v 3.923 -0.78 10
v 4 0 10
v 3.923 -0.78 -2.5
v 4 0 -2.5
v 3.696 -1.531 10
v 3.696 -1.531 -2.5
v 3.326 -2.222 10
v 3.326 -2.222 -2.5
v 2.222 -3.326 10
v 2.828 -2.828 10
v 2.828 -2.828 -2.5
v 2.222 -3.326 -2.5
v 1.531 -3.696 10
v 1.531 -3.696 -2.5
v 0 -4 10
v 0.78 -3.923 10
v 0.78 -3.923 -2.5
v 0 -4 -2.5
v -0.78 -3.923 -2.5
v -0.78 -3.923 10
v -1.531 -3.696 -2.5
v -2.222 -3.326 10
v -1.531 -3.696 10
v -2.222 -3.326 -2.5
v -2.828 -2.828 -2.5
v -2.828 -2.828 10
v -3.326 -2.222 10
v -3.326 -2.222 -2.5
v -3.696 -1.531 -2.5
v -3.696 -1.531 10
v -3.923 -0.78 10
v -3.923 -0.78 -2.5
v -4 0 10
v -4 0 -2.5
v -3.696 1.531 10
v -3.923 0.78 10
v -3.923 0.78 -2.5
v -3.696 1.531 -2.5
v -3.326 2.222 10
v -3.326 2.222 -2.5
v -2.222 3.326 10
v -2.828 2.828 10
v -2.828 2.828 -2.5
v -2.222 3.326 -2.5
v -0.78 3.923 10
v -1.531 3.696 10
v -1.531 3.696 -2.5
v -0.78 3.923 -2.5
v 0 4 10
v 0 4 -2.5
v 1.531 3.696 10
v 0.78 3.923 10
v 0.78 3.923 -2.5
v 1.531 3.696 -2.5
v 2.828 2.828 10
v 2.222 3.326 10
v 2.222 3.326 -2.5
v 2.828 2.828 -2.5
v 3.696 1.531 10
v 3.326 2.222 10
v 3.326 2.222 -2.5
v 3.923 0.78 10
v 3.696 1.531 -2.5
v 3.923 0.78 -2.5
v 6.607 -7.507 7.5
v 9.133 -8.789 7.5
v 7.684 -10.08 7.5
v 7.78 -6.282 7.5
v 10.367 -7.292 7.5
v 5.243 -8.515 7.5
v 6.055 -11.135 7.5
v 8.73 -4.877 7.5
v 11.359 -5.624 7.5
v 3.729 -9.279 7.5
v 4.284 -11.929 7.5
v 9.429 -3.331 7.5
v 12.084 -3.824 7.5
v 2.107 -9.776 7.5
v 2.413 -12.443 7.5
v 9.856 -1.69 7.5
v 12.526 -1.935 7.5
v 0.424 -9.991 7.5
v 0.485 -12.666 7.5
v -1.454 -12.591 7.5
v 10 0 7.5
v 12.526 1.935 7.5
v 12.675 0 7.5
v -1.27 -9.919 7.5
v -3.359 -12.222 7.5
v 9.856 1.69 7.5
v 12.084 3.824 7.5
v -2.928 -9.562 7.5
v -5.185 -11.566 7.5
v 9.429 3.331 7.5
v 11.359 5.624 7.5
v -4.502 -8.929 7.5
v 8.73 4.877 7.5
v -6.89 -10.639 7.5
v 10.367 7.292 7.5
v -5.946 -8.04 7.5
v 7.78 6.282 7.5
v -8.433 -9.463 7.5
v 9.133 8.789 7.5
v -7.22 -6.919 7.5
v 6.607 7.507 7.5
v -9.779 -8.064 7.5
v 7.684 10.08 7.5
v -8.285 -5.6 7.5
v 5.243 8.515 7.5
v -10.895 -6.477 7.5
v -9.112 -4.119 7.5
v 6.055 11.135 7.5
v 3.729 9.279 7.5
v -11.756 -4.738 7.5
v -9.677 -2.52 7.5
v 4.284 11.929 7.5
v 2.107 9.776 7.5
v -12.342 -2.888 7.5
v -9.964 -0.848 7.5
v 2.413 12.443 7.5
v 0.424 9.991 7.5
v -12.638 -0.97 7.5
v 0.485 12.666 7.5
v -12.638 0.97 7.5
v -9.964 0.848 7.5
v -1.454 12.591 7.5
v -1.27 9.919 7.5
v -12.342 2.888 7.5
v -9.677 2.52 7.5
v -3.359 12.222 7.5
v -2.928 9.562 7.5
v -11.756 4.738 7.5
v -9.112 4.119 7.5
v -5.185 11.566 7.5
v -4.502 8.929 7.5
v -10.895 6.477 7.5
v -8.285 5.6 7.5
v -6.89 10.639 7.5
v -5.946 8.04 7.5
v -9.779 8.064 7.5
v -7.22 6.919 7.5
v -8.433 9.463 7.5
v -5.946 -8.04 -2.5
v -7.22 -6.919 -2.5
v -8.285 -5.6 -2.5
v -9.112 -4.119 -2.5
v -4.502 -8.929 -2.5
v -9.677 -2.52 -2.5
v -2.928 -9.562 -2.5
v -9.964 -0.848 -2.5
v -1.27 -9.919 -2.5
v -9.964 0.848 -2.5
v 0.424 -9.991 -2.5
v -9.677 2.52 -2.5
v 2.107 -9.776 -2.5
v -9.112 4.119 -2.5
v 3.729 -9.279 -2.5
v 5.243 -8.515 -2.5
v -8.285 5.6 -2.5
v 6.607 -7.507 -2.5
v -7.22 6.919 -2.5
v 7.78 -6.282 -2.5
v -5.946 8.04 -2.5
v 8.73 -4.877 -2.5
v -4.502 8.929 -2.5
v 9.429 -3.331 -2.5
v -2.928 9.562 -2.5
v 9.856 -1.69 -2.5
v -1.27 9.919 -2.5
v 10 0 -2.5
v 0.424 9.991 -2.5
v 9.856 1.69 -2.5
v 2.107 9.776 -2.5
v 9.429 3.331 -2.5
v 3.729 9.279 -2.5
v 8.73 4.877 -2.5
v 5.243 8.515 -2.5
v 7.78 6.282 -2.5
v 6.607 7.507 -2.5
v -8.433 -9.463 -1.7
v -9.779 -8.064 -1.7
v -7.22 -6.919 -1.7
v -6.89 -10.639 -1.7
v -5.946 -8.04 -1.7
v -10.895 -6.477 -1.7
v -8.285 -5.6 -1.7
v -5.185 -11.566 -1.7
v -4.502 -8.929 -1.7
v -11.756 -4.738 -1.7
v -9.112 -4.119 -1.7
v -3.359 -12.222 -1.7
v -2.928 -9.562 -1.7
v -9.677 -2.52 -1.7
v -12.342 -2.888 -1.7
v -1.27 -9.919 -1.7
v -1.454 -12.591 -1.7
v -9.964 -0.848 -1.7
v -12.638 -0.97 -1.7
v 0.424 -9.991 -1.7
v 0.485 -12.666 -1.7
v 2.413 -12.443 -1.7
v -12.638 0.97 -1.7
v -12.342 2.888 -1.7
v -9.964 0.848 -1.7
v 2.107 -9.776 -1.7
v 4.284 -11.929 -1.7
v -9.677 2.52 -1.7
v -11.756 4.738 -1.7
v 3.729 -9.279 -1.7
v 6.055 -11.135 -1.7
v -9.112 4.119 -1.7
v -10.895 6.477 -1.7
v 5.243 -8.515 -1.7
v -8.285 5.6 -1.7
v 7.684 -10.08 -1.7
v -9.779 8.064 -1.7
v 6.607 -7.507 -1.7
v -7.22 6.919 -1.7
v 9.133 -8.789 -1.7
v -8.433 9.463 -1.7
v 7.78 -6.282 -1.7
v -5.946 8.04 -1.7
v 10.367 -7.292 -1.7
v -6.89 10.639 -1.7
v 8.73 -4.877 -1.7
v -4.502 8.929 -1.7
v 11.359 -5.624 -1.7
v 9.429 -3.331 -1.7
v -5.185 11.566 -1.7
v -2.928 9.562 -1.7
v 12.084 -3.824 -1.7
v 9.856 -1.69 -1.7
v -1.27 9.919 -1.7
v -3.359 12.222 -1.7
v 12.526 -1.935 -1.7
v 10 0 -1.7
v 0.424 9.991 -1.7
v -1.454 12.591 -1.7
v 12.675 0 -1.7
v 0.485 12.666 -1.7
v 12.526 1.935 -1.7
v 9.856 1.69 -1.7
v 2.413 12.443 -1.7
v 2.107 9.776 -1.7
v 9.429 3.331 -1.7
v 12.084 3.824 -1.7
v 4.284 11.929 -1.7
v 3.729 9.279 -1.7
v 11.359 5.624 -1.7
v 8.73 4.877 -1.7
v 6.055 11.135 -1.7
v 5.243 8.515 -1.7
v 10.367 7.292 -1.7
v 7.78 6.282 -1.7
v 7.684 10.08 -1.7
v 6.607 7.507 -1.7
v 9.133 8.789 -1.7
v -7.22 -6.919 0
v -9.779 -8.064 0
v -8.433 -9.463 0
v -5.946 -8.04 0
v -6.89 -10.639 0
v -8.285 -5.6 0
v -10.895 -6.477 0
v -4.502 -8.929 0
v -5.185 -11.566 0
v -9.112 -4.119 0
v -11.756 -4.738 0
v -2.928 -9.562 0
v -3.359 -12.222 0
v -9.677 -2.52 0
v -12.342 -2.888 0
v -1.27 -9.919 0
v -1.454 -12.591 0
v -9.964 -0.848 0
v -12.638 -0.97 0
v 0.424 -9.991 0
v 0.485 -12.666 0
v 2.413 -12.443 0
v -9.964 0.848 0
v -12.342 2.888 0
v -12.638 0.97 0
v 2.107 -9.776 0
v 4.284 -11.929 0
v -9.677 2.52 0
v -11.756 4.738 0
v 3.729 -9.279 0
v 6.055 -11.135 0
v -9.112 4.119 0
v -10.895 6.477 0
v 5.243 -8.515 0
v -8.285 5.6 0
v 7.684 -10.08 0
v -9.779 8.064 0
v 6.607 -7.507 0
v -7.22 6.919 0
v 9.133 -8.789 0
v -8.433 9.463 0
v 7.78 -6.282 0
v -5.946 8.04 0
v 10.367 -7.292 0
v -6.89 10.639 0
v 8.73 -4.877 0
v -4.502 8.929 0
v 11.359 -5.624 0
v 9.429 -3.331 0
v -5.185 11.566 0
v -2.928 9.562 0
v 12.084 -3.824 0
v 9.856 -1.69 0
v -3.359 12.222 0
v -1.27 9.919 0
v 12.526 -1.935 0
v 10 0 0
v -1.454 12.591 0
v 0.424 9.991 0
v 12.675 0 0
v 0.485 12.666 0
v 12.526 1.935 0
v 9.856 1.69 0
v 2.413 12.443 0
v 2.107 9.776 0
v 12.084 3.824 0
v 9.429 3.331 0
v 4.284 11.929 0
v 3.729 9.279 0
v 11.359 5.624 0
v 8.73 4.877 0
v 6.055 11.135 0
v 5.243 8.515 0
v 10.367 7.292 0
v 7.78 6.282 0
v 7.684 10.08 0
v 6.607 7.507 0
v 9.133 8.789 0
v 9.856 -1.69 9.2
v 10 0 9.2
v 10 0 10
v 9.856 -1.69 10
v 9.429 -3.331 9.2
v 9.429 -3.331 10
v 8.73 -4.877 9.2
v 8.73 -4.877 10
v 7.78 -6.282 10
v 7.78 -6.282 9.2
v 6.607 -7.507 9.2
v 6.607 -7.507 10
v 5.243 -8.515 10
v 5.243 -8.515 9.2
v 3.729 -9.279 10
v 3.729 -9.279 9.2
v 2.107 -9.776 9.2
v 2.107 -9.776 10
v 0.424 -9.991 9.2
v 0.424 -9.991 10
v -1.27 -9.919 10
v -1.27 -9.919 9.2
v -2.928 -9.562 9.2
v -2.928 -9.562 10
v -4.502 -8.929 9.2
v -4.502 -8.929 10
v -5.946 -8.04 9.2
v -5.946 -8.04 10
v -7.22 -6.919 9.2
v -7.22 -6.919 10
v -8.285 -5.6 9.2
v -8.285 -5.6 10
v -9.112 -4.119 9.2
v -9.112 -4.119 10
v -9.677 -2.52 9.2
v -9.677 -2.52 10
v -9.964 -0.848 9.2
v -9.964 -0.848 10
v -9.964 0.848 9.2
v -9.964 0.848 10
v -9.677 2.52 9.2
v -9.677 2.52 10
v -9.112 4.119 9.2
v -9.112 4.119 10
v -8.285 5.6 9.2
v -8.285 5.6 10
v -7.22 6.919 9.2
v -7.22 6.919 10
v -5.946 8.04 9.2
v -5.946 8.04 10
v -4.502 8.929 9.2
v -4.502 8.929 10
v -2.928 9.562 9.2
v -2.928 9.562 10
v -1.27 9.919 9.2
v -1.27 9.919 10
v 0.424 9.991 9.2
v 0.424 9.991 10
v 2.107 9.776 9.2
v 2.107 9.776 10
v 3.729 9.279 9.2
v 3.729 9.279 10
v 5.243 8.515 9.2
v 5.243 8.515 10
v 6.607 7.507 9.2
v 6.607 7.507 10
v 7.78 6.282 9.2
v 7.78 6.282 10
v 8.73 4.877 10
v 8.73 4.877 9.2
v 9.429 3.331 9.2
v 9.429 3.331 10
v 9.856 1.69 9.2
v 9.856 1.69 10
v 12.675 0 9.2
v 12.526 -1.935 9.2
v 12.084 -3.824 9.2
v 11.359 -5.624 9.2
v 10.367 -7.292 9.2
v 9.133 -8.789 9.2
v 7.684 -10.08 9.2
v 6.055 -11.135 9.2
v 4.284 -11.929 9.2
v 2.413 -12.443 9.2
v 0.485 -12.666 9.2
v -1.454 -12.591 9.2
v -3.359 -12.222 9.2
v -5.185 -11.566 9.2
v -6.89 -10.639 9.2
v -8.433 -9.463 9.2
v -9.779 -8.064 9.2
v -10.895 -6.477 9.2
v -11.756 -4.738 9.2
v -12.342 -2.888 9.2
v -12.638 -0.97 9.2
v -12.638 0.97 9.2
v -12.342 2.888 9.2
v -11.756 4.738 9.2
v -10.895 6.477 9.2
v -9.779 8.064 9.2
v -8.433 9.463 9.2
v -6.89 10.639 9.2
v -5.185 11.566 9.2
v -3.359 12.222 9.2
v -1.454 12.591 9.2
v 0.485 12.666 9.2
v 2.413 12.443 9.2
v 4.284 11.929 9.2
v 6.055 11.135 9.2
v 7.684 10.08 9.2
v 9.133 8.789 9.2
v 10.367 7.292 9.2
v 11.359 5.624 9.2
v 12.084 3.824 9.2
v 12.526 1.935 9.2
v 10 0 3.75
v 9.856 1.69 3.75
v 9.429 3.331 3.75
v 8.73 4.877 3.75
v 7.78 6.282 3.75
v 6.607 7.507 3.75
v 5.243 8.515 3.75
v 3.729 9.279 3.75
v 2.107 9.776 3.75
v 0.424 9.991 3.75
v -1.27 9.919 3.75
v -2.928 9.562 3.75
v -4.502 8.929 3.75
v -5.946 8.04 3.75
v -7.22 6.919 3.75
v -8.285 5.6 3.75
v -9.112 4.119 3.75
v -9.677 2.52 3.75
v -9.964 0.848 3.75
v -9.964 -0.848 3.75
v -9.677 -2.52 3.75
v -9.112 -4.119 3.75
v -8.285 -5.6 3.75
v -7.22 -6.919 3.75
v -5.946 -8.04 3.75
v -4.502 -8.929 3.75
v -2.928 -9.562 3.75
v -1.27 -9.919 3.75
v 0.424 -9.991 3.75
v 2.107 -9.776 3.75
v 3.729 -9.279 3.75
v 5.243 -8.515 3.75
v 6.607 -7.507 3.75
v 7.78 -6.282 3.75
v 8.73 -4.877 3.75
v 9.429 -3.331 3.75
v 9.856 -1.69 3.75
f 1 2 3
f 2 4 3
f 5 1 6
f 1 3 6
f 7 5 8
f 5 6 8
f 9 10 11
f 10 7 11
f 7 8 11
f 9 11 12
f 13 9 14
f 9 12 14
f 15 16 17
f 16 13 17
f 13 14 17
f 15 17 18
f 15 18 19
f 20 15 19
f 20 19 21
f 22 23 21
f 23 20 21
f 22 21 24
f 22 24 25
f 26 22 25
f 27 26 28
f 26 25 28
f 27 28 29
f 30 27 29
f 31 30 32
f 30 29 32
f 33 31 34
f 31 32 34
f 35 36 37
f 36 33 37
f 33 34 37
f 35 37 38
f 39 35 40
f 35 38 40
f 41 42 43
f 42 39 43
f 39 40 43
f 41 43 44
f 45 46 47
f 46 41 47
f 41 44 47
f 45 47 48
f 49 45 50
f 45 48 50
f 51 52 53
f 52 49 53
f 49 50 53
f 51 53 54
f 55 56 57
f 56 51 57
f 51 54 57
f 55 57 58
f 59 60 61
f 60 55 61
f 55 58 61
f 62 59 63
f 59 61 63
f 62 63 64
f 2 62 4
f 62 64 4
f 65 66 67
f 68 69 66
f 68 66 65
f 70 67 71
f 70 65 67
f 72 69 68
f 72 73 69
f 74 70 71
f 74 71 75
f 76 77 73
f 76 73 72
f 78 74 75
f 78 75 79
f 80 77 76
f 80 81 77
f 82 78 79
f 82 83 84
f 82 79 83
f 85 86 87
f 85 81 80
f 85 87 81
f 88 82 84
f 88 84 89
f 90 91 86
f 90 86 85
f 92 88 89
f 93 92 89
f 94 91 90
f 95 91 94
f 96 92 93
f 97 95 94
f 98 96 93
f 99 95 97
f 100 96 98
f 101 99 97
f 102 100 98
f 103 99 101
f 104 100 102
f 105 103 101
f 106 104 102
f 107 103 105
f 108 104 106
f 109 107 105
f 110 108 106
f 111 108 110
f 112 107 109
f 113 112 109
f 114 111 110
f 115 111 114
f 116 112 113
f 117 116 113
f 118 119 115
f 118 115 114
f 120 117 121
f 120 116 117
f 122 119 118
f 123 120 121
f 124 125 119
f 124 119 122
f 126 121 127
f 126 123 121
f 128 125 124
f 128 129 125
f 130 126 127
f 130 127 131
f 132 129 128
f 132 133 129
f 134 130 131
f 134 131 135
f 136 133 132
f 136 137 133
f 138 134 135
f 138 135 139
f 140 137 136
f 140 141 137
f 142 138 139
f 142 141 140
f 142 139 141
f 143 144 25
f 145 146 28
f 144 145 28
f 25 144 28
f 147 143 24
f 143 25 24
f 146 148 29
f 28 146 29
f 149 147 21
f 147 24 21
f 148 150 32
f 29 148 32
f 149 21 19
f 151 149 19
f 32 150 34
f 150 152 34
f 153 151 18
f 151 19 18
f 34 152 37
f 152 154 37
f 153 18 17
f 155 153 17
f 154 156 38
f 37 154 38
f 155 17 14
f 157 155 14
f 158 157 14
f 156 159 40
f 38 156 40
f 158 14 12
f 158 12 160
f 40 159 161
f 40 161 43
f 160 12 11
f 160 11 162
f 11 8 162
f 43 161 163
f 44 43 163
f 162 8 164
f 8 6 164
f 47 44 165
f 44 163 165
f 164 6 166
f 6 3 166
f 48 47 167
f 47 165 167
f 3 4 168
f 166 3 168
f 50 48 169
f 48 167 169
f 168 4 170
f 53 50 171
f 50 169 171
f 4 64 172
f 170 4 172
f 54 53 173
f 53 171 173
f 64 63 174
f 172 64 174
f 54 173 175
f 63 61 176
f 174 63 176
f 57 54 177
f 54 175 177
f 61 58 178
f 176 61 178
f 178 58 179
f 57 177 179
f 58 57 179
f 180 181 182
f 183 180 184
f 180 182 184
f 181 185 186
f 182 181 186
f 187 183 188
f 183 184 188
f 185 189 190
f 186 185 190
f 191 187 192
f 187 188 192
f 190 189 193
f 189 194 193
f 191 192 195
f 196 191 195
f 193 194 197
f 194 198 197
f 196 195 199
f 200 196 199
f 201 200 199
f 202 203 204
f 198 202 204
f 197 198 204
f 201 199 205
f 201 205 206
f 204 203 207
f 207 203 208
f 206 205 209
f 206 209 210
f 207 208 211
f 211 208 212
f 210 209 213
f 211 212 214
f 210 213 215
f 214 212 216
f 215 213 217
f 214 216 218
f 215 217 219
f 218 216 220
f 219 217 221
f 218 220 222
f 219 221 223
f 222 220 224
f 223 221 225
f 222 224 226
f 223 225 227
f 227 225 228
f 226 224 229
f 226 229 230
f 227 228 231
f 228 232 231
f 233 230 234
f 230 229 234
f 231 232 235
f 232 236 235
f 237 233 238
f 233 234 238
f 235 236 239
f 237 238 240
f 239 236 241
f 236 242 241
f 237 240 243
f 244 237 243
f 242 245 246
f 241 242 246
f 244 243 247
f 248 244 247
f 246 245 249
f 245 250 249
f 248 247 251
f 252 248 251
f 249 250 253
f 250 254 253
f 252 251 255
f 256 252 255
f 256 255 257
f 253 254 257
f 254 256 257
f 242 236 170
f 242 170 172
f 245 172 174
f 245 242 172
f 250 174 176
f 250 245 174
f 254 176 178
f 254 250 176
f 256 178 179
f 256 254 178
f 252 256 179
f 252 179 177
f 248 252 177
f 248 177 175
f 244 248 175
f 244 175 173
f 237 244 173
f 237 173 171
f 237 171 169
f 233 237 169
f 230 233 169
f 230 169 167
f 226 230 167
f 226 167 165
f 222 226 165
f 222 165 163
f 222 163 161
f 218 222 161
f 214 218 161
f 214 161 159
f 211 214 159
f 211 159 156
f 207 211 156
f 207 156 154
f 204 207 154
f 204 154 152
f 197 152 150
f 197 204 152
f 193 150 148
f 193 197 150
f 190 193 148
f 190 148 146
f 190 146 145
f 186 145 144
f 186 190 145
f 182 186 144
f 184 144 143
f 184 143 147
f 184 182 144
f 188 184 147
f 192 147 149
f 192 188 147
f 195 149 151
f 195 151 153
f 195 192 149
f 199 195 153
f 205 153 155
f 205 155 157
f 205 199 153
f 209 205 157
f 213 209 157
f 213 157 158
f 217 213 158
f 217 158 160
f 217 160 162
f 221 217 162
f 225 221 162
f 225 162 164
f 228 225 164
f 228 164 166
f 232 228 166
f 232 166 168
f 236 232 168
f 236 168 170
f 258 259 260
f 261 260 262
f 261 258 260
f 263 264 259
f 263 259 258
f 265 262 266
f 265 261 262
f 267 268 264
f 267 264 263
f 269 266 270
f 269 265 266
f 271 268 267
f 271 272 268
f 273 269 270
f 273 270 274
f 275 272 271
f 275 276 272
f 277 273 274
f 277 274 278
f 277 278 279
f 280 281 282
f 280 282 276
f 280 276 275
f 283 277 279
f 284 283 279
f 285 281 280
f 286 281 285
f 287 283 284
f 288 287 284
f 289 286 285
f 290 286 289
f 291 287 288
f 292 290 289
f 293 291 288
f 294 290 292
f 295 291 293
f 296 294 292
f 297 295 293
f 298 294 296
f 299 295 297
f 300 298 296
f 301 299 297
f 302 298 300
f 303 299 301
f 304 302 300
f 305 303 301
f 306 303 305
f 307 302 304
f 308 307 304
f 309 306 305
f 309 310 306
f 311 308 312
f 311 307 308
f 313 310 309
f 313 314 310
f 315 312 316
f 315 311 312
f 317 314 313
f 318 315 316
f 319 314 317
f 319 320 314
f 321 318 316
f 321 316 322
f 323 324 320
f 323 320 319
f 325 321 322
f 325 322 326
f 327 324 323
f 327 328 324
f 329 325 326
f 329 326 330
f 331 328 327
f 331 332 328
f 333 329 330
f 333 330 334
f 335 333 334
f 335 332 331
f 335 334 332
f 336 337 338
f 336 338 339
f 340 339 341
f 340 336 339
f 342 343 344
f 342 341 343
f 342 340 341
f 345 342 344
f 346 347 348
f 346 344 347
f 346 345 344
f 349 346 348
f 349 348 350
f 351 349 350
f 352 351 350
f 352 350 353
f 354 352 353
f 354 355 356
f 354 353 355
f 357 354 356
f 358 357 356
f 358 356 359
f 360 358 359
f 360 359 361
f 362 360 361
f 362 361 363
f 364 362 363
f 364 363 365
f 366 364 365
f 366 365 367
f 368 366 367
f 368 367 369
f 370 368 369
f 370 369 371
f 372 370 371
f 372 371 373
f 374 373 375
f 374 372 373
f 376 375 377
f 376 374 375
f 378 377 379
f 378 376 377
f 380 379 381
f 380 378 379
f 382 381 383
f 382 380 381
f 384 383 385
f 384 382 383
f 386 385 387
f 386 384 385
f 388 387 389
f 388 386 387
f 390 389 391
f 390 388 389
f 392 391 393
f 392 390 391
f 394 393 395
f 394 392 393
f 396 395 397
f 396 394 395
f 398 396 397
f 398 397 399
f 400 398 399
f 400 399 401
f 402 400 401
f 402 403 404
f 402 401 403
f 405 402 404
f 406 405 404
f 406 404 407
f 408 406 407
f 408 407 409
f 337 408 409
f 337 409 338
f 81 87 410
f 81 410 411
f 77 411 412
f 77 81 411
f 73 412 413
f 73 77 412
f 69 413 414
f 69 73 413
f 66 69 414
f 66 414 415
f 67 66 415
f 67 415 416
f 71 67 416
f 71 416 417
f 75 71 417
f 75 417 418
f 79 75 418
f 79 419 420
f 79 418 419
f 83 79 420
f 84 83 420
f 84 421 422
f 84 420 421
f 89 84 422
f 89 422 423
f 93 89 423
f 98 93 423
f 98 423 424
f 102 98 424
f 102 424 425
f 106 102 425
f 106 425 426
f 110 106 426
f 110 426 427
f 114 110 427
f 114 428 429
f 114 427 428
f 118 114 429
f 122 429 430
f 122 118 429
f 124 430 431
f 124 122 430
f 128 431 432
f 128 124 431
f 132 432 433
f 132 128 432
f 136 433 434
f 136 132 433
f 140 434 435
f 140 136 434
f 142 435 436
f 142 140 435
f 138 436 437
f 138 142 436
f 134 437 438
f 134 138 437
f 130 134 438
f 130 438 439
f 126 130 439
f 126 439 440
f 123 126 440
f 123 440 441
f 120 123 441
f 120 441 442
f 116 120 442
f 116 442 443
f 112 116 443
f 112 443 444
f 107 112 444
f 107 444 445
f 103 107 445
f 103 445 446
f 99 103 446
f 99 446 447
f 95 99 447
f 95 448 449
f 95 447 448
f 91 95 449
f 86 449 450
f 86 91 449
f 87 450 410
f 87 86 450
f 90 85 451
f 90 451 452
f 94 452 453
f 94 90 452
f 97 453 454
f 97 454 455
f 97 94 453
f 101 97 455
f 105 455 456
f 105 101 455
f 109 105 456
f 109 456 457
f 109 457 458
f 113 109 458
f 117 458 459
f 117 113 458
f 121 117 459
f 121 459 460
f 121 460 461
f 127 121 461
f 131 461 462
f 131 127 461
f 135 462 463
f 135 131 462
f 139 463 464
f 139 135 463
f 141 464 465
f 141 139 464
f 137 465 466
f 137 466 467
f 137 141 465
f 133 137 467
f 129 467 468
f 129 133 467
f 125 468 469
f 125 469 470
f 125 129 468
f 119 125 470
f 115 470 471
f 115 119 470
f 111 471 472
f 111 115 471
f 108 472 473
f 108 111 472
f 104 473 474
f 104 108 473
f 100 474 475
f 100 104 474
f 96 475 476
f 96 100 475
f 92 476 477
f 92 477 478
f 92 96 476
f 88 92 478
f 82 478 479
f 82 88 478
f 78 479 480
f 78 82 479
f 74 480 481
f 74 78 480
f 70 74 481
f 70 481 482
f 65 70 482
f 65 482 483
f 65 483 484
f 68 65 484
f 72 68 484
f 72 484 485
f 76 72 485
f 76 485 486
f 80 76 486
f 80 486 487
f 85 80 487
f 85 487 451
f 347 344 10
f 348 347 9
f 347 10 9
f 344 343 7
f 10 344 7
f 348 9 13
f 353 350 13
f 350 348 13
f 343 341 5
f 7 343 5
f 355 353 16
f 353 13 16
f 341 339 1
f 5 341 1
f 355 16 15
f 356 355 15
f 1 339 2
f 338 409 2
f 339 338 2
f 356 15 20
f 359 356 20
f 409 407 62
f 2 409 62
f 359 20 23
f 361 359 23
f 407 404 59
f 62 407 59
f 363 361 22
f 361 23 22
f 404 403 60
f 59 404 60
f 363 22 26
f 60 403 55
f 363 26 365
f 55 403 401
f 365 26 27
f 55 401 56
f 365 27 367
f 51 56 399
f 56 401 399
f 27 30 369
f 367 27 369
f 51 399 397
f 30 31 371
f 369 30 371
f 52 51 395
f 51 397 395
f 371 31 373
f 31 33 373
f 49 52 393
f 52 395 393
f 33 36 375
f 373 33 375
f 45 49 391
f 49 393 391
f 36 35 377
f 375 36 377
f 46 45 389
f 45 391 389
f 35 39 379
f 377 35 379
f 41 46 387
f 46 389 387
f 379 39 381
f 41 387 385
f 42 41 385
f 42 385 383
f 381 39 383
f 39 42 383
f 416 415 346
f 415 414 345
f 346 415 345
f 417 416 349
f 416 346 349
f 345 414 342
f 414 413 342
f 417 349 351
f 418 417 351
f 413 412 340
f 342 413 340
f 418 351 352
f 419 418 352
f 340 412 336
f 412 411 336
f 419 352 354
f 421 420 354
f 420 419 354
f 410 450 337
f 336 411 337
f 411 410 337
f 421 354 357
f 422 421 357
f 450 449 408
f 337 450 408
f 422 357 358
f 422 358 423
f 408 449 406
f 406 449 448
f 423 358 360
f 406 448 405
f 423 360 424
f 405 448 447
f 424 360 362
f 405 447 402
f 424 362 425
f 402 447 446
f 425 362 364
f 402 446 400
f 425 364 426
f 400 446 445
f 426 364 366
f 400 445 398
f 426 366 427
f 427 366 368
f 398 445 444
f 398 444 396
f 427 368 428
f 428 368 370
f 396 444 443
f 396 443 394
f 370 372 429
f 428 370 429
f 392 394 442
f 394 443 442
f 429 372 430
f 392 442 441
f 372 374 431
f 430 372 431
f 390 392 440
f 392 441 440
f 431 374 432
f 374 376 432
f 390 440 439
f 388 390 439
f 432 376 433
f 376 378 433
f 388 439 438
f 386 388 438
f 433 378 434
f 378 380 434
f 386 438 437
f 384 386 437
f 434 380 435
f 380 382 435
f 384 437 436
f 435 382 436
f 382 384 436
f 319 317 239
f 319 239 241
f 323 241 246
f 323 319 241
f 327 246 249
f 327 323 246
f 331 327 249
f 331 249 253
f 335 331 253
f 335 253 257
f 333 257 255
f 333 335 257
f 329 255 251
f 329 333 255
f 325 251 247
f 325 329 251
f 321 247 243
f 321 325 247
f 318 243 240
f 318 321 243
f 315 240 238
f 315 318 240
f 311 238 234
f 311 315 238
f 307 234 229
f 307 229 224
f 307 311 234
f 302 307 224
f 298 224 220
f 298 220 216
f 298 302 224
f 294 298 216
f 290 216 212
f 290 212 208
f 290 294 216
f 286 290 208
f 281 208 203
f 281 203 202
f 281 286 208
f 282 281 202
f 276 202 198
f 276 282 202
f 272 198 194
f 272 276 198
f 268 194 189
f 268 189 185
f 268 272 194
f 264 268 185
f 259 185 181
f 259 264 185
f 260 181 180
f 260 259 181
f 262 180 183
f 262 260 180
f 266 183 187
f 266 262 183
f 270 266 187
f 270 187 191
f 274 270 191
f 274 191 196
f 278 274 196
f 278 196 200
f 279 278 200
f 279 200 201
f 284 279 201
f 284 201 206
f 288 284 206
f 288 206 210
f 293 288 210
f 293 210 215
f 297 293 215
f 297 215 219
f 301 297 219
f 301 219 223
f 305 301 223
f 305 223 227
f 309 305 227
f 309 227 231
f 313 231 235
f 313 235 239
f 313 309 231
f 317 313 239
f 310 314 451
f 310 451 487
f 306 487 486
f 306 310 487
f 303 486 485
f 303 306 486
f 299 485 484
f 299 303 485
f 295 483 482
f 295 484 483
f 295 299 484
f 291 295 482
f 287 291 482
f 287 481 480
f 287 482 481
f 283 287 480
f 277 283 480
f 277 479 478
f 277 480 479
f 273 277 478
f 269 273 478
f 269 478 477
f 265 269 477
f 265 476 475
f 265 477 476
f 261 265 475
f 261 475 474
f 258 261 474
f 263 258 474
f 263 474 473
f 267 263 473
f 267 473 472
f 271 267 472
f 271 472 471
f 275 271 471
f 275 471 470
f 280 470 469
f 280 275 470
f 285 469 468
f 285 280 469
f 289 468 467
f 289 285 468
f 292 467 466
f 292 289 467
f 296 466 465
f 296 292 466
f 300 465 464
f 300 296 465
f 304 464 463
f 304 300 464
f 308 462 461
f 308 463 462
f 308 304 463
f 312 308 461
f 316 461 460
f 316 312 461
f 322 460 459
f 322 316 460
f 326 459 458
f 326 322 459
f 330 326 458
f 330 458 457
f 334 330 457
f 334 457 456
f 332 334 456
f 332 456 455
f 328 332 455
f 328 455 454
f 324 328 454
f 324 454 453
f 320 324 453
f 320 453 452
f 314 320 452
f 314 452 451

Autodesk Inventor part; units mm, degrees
ref_plane "YZ Plane" through (0, 0, 0) normal (1, 0, 0) x (0, 1, 0)
ref_plane "XZ Plane" through (0, 0, 0) normal (0, 1, 0) x (-1, 0, 0)
ref_plane "XY Plane" through (0, 0, 0) normal (0, 0, 1) x (1, 0, 0)
sketch "スケッチ1" plane through (0, 0, 0) normal (0, 0, 1) x (1, 0, 0)
  circle A0 centre (0, 0) radius 12.675
  circle A1 centre (0, 0) radius 4
  circle A2 centre (0, 0) radius 10
  circle A3 centre (0, 0) radius 16
  dimension "d0" = 25.35
  dimension "d1" = 8
  dimension "d2" = 20
  dimension "d3" = 32
extrude "押し出し1" add sketch "スケッチ1" along normal blind 3.75 contours A2
extrude "押し出し2" add sketch "スケッチ1" against normal blind 1.7 contours A0
extrude "押し出し3" add sketch "スケッチ1" against normal blind 2.5 contours A2
mirror "ミラー1" about plane through (0, 0, 3.75) normal (0, 0, 1) of "押し出し1", "押し出し2", "押し出し3"
properties part number "timing _pulley_7.5_8"
